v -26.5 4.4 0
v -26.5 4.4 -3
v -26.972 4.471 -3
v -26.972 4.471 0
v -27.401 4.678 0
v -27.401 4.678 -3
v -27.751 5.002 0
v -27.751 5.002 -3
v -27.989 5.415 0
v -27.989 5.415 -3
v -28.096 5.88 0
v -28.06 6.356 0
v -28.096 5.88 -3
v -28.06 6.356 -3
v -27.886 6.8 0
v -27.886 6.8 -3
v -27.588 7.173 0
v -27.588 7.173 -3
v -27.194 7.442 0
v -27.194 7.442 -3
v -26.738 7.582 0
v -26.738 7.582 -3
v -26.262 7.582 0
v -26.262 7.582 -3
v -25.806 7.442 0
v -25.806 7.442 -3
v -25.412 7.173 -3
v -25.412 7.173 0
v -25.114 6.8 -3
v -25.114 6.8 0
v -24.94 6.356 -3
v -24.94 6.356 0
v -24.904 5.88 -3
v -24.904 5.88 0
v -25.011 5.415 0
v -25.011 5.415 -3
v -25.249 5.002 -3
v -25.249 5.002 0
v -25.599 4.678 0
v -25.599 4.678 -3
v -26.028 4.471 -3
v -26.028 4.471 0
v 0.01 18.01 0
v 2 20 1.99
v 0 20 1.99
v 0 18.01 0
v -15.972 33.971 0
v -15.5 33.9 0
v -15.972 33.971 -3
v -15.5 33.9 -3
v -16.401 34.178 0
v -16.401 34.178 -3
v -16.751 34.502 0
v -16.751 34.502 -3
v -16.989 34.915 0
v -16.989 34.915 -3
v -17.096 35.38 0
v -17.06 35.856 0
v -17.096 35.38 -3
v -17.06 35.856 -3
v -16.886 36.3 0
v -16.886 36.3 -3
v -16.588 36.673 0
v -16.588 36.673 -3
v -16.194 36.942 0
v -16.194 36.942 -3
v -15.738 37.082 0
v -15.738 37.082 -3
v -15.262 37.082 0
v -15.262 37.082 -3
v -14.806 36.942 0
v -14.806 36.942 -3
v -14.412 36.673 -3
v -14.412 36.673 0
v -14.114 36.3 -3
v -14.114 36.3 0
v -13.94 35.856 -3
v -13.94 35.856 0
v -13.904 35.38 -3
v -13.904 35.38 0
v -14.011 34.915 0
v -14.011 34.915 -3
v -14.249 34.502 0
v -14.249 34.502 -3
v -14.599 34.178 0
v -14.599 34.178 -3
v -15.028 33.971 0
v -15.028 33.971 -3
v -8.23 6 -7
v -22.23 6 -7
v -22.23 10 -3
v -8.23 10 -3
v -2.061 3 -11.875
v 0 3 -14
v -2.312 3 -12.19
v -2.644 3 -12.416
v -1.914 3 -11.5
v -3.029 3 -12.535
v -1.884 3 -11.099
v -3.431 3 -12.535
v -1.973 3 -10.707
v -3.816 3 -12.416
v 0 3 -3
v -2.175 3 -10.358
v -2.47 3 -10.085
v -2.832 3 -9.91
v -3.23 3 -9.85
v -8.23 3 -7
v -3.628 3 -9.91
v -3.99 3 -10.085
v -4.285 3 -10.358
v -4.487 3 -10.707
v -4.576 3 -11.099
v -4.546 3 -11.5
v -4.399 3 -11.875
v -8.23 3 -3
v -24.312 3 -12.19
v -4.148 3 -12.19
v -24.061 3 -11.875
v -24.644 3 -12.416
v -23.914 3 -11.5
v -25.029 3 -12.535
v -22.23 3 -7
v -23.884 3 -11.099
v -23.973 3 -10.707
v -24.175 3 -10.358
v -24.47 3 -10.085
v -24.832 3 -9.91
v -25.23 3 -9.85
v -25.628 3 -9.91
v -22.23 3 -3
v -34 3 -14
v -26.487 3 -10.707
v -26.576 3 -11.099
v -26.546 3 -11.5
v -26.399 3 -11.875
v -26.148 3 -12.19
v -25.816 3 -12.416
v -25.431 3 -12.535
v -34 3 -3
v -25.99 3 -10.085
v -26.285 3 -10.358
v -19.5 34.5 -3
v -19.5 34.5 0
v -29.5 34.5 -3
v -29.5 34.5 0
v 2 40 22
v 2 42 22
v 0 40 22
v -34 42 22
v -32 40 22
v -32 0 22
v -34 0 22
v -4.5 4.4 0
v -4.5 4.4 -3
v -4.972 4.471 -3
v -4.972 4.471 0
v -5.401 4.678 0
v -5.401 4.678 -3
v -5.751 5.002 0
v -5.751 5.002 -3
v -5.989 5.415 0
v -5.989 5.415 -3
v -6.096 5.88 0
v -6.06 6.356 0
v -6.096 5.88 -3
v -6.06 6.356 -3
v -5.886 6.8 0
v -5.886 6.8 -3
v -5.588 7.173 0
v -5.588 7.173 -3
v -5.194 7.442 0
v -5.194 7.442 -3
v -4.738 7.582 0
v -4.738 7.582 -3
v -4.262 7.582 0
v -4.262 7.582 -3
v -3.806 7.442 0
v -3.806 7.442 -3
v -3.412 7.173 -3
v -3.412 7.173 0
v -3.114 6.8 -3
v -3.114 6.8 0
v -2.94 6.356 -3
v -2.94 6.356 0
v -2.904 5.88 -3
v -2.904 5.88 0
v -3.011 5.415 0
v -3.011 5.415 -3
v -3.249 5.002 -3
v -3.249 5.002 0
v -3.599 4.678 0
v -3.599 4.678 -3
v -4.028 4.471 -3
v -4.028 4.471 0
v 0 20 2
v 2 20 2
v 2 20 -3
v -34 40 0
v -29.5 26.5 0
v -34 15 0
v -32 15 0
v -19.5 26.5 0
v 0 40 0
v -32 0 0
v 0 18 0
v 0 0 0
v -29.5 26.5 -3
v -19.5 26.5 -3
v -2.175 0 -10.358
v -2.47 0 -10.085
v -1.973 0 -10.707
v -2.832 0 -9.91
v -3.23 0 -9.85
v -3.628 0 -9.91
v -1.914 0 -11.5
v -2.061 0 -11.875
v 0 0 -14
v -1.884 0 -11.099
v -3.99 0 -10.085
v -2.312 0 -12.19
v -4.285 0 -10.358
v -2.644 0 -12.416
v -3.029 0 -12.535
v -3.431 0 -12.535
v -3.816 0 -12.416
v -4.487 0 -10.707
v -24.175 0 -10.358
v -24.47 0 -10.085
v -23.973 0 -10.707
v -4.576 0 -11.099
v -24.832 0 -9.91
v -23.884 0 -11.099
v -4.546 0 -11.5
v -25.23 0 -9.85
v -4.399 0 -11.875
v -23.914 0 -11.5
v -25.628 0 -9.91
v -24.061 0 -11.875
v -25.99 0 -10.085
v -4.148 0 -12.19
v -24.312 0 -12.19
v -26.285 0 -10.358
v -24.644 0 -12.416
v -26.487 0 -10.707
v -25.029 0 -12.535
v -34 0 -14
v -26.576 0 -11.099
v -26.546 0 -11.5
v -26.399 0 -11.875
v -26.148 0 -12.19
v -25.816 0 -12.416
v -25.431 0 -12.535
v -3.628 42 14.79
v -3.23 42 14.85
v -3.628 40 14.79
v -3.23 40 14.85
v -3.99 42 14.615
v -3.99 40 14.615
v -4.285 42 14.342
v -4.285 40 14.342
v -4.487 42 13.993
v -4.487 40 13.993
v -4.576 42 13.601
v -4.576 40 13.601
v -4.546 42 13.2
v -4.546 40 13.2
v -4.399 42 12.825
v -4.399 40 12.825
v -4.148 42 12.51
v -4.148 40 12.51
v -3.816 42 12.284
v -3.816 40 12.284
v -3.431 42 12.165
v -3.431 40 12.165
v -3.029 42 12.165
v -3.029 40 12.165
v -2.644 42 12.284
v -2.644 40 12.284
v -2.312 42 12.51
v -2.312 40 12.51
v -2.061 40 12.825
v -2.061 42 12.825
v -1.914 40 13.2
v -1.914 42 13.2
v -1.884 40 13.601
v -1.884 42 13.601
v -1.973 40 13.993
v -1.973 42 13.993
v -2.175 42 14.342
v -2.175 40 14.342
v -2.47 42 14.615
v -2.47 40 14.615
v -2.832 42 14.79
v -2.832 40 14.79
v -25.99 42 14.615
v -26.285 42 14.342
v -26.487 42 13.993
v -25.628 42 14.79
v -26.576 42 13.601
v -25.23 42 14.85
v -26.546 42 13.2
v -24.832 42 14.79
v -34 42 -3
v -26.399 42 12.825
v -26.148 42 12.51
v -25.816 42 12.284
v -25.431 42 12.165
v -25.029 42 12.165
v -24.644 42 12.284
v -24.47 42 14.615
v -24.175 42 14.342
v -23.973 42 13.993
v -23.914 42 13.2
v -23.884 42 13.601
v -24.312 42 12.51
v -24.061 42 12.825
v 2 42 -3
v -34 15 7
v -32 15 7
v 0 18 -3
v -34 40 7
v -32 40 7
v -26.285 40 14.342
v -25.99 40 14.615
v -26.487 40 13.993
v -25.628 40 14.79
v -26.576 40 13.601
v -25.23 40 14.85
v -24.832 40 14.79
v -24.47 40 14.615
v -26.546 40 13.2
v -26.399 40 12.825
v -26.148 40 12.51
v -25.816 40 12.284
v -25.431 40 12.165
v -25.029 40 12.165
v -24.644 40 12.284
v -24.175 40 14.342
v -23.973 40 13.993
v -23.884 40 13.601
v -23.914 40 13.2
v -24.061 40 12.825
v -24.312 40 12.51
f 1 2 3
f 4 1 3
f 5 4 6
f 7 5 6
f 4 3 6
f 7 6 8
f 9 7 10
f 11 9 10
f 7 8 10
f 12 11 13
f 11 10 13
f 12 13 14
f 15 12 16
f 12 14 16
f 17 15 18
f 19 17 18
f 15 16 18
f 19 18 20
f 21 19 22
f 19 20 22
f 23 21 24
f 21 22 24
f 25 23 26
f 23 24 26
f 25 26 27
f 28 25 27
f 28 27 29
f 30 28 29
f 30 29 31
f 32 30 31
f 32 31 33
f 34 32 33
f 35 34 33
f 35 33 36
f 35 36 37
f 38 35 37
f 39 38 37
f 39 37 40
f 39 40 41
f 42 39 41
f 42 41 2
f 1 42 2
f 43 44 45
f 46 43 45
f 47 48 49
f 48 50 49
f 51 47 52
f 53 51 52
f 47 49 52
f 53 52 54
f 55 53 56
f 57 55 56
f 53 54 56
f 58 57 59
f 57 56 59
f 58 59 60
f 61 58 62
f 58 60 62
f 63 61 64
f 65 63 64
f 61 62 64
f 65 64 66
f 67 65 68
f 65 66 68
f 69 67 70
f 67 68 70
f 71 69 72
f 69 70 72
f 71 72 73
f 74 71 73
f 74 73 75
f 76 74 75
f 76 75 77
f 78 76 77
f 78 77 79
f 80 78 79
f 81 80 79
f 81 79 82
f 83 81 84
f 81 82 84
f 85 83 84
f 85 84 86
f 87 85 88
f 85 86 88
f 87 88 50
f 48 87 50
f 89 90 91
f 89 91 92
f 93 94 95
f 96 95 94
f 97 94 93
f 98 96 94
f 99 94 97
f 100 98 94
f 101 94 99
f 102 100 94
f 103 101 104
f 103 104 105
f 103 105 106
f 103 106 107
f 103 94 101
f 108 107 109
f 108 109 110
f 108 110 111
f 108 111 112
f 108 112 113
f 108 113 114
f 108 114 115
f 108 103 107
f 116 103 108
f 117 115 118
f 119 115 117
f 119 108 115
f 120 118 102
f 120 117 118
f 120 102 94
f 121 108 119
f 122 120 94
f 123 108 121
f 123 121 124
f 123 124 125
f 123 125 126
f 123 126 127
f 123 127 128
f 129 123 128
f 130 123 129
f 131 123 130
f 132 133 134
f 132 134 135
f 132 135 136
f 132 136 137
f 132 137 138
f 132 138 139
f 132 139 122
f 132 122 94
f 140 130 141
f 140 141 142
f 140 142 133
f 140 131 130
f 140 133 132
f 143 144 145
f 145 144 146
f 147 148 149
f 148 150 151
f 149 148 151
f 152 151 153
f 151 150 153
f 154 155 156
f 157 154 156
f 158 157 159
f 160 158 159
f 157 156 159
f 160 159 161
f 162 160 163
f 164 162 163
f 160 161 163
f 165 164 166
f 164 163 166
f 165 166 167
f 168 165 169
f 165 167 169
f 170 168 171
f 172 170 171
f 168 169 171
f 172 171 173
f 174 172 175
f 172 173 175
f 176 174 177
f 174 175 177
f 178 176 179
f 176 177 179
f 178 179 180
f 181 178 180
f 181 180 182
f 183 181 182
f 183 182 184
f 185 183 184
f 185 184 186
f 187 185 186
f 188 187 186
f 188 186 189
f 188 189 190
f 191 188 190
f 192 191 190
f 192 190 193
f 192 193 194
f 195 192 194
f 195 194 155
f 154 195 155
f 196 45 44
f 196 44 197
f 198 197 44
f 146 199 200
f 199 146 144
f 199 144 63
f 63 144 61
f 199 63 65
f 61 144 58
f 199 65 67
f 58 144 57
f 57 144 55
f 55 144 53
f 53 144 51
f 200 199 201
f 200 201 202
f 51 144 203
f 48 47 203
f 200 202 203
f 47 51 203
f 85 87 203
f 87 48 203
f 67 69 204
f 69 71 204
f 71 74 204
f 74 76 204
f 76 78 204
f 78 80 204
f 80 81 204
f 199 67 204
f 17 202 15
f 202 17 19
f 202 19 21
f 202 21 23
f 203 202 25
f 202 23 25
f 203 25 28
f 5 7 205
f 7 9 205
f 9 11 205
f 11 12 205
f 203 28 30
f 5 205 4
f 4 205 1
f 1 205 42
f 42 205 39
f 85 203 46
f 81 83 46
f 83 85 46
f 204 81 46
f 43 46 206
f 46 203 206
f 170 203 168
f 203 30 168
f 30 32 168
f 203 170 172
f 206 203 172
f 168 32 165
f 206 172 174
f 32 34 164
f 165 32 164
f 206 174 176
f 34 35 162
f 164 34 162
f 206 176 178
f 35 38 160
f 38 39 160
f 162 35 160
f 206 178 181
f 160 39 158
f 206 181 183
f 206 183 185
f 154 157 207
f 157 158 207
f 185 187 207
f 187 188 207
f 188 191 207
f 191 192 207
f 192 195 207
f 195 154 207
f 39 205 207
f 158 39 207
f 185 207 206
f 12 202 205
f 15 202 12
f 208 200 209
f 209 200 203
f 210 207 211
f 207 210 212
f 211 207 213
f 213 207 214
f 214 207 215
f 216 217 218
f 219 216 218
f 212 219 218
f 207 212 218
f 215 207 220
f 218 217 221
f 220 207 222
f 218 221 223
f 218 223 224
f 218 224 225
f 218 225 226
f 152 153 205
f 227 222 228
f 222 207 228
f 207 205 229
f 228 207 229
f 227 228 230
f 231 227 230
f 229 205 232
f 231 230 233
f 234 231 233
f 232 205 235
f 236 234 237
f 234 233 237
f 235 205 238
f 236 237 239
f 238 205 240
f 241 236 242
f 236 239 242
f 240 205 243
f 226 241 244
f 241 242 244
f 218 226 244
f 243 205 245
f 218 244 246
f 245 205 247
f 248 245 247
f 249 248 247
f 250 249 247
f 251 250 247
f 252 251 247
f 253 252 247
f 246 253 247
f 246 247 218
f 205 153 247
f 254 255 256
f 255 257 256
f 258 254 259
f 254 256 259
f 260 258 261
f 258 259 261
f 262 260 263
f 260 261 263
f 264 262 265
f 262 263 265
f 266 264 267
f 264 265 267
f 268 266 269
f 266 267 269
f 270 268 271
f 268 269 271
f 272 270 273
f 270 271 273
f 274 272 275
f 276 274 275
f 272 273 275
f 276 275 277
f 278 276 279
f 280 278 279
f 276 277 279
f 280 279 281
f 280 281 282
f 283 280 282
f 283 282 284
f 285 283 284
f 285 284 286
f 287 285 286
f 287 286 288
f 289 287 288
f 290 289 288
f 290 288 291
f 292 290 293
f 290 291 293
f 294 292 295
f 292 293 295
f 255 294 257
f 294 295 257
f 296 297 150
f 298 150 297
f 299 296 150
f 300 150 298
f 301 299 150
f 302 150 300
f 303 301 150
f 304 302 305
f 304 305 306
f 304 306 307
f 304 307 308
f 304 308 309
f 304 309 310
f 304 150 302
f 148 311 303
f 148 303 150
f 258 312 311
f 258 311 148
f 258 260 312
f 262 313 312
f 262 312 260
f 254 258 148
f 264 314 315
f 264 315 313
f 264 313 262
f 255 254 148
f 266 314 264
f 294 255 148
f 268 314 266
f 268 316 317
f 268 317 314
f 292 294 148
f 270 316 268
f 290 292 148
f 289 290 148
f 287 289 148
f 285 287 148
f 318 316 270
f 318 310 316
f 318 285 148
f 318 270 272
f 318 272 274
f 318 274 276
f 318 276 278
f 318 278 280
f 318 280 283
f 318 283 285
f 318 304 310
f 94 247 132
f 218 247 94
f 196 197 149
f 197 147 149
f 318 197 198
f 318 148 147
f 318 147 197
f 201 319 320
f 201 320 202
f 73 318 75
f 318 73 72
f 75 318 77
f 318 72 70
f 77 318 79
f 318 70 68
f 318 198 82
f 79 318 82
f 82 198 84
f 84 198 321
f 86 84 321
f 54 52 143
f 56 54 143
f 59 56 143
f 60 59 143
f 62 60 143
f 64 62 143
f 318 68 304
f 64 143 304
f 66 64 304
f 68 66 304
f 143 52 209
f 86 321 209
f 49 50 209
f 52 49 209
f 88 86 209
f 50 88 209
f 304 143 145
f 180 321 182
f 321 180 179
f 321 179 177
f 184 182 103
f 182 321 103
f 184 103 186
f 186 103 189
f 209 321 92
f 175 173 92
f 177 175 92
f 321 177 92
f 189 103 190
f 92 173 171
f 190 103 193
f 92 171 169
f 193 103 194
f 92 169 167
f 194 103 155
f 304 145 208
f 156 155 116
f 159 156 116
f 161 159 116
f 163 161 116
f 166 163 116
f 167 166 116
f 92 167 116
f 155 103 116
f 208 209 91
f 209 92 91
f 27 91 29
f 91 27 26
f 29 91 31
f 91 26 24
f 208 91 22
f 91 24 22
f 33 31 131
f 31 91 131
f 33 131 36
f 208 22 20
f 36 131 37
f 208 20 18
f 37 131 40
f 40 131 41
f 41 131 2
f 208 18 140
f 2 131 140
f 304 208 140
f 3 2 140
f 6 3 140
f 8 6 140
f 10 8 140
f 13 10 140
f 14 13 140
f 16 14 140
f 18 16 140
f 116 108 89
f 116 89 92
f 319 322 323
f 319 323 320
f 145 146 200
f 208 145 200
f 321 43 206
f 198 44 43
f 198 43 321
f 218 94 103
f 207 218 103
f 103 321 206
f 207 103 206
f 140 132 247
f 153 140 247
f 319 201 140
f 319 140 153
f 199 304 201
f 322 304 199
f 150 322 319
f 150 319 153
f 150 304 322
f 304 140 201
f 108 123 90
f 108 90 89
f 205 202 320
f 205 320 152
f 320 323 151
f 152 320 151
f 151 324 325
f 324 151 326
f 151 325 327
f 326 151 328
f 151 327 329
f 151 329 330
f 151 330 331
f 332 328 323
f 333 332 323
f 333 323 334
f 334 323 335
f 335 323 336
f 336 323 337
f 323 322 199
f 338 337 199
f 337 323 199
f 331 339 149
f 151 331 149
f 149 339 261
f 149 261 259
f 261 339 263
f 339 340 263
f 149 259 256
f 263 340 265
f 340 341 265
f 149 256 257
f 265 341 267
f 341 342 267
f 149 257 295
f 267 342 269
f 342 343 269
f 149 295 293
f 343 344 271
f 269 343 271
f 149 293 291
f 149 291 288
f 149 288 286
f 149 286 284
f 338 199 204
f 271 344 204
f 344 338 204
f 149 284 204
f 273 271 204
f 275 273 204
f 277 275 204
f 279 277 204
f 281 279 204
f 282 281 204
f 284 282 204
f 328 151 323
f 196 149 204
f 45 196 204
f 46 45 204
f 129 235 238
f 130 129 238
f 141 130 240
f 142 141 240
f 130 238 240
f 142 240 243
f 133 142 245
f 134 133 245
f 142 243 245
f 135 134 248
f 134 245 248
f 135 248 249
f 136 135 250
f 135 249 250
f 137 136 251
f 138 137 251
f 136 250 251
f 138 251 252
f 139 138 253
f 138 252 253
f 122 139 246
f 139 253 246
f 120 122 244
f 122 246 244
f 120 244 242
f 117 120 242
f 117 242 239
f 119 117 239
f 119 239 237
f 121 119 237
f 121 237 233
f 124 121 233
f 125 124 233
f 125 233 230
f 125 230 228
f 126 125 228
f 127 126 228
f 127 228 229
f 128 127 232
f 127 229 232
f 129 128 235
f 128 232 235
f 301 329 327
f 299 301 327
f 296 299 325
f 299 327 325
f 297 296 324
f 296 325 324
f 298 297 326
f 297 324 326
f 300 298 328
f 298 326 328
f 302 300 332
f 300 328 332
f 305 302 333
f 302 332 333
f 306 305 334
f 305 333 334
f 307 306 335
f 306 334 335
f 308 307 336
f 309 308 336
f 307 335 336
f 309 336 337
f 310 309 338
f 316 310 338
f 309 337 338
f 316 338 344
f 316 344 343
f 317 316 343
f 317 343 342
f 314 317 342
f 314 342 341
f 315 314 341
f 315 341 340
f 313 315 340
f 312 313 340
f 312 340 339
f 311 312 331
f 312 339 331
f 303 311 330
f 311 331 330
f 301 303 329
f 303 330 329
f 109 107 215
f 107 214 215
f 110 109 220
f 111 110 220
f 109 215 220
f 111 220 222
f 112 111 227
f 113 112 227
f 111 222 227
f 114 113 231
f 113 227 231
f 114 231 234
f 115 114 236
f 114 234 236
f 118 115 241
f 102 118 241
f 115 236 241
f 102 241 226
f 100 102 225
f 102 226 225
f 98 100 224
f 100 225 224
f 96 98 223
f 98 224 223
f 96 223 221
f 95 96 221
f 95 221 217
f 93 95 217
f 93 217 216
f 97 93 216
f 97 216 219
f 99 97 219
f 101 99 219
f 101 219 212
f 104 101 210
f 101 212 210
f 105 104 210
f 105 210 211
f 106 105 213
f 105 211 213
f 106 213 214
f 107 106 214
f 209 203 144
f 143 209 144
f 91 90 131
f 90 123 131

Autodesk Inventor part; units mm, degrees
ref_plane "YZ Plane" through (0, 0, 0) normal (1, 0, 0) x (0, 1, 0)
ref_plane "XZ Plane" through (0, 0, 0) normal (0, 1, 0) x (-1, 0, 0)
ref_plane "XY Plane" through (0, 0, 0) normal (0, 0, 1) x (1, 0, 0)
sketch "Sketch1" plane through (0, 0, 0) normal (0, 1, 0) x (-1, 0, 0)
  line L0 (0, 0) -> (34, 0)
  line L1 (34, 0) -> (34, -14)
  line L2 (34, -14) -> (0, -14)
  line L3 (0, -14) -> (0, 0)
  dimension "d0" = 34
  dimension "d1" = 14
extrude "Extrusion1" add sketch "Sketch1" along normal blind 3
sketch "Sketch2" plane through (0, 3, 0) normal (0, 1, 0) x (1, 0, 0)
  line L0 (-34, 0) -> (0, 0) projected
  line L1 (0, 0) -> (0, 14) projected
  line L2 (0, 14) -> (-34, 14) projected
  line L3 (-34, 14) -> (-34, 0) projected
  point P0 (-25.23, 11.2)
  point P1 (-3.23, 11.2)
  dimension "d59" = 22
  dimension "d60" = 8.77
hole "Hole1" at (-25.23, 3, -11.2) at (-3.23, 3, -11.2) direction (0, -1, 0) diameter 2.7 end through all
sketch "Sketch3" plane through (0, 3, 0) normal (0, 1, 0) x (1, 0, 0)
  circle A0 centre (-25.23, 11.2) radius 1.35 projected
  circle A1 centre (-3.23, 11.2) radius 1.35 projected
  line L0 (-34, 0) -> (0, 0) projected
  line L1 (0, 0) -> (0, 14) projected
  line L2 (0, 14) -> (-34, 14) projected
  line L3 (-34, 14) -> (-34, 0) projected
  line L4 (0, 0) -> (-34, 0) projected
  line L5 (-34, 0) -> (0, 0)
  line L6 (0, 0) -> (0, 3)
  line L7 (0, 3) -> (-34, 3)
  line L8 (-34, 3) -> (-34, 0)
  dimension "d14" = 3
extrude "Extrusion2" add sketch "Sketch3" along normal blind 39 contours L3 L7 L1 L0
sketch "Sketch4" plane through (0, 42, 0) normal (0, 1, 0) x (1, 0, 0)
  line L0 (-34, 0) -> (0, 0) projected
  line L1 (0, 0) -> (0, 3) projected
  line L2 (0, 3) -> (-34, 3) projected
  line L3 (-34, 3) -> (-34, 0) projected
  line L4 (-34, 3) -> (0, 3)
  line L5 (0, 3) -> (0, -22)
  line L6 (0, -22) -> (-34, -22)
  line L7 (-34, -22) -> (-34, 3)
  dimension "d17" = 25
extrude "Extrusion3" add sketch "Sketch4" against normal blind 2 contours L0 L5 L6 L7
sketch "Sketch6" plane through (0, 42, 0) normal (0, 1, 0) x (1, 0, 0)
  line L0 (0, -22) -> (0, 3) projected
  line L1 (0, 3) -> (-34, 3) projected
  line L2 (-34, 3) -> (-34, -22) projected
  line L3 (-34, -22) -> (0, -22) projected
  line L4 (0, 14) -> (0, -22) projected
  point P0 (0, 0)
  point P1 (-3.23, -13.5)
  point P2 (-25.23, -13.5)
  dimension "d57" = 22
  dimension "d58" = 3.23
hole "Hole2" at (-3.23, 42, 13.5) at (-25.23, 42, 13.5) direction (0, -1, 0) diameter 2.7 end through all
sketch "Sketch7" plane through (-34, 0, 0) normal (0, 0, 1) x (1, 0, 0)
  line L0 (34, 40) -> (0, 40) projected
  line L1 (0, 0) -> (0, 40) projected
  line L2 (34, 0) -> (0, 0) projected
  line L3 (34, 0) -> (34, 40) projected
  point P0 (7.5, 6)
  point P1 (29.5, 6)
  point P2 (18.5, 35.5)
  dimension "d50" = 11
  dimension "d51" = 29.5
  dimension "d52" = 22
  dimension "d55" = 4.5
hole "Hole3" at (-26.5, 6, 0) at (-4.5, 6, 0) at (-15.5, 35.5, 0) direction (0, 0, -1) diameter 3.2 end through all
sketch "Sketch8" plane through (-34, 0, 0) normal (0, 0, 1) x (1, 0, 0)
  circle A0 centre (29.5, 6) radius 1.6 projected
  circle A1 centre (7.5, 6) radius 1.6 projected
  circle A2 centre (18.5, 35.5) radius 1.6 projected
  line L0 (34, 40) -> (0, 40) projected
  line L1 (0, 0) -> (0, 40) projected
  line L2 (34, 0) -> (0, 0) projected
  line L3 (14.5, 34.5) -> (4.5, 34.5)
  line L4 (4.5, 34.5) -> (4.5, 26.5)
  line L5 (4.5, 26.5) -> (14.5, 26.5)
  line L6 (14.5, 26.5) -> (14.5, 34.5)
  line L7 (34, 0) -> (34, 40) projected
  dimension "d46" = 10
  dimension "d47" = 8
  dimension "d53" = 1
  dimension "d54" = 4
extrude "Extrusion5" cut sketch "Sketch8" against normal blind 3 contours L6 L5 L4 L3
sketch "Sketch9" plane through (-34, 0, -14) normal (-1, 0, 0) x (0, 0, 1)
  line L0 (14, 0) -> (0, 0) projected
  line L1 (14, 0) -> (14, 40) projected
  line L2 (36, 40) -> (14, 40) projected
  line L3 (36, 42) -> (36, 40) projected
  line L4 (11, 42) -> (36, 42) projected
  line L5 (11, 3) -> (11, 42) projected
  line L6 (0, 3) -> (11, 3) projected
  line L7 (0, 0) -> (0, 3) projected
  line L8 (14, 40) -> (36, 40)
  line L9 (36, 40) -> (36, 0)
  line L10 (36, 0) -> (14, 0)
  line L11 (14, 0) -> (14, 40)
extrude "Extrusion6" add sketch "Sketch9" against normal blind 2 contours L1 L2 L9 L10
sketch "Sketch10" plane through (0, 0, 0) normal (1, 0, 0) x (0, 0, -1)
  line L0 (14, 0) -> (0, 0) projected
  line L1 (14, 0) -> (14, 3) projected
  line L2 (3, 3) -> (14, 3) projected
  line L3 (3, 3) -> (3, 42) projected
  line L4 (-22, 42) -> (3, 42) projected
  line L5 (-22, 42) -> (-22, 40) projected
  line L6 (0, 40) -> (-22, 40) projected
  line L7 (0, 0) -> (0, 40) projected
  line L8 (-22, 42) -> (-22, 40) projected
  line L9 (3, 3) -> (3, 42) projected
  line L10 (-22, 42) -> (3, 42)
  line L11 (3, 42) -> (3, 20)
  line L12 (3, 20) -> (-22, 20)
  line L13 (-22, 20) -> (-22, 42)
  dimension "d63" = 22
extrude "Extrusion7" add sketch "Sketch10" along normal blind 2 contours L12 L13 L6 L7 | L7 L6 L5 L4 L3 L12
chamfer "Chamfer1" distance 2 angle 45 1 edges at (0, 20, -1.5)
chamfer "Chamfer2" distance 20 angle 45 1 edges at (1, 20, 22)
chamfer "Chamfer3" distance 1.99 angle 45 1 edges at (0.9999, 20, 0)
sketch "Sketch11" plane through (-34, 0, -14) normal (-1, 0, 0) x (0, 0, 1)
  line L0 (14, 40) -> (14, 0) projected
  line L1 (36, 40) -> (14, 40) projected
  line L2 (14, 40) -> (21, 40)
  line L3 (21, 40) -> (21, 15)
  line L4 (21, 15) -> (14, 15)
  line L5 (14, 15) -> (14, 40)
  dimension "d75" = 7
  dimension "d76" = 25
extrude "Extrusion8" cut sketch "Sketch11" against normal blind 2
sketch "Sketch12" plane through (0, 3, 0) normal (0, 1, 0) x (1, 0, 0)
  line L0 (-34, 3) -> (0, 3) projected
  line L1 (0, 3) -> (0, 14) projected
  line L2 (0, 14) -> (-34, 14) projected
  line L3 (-34, 14) -> (-34, 3) projected
  circle A0 centre (-25.23, 11.2) radius 1.35 projected
  circle A1 centre (-3.23, 11.2) radius 1.35 projected
  line L4 (-34, 3) -> (0, 3) projected
  line L5 (-3.23, 11.2) -> (-8.23, 11.2)
  line L6 (-8.23, 11.2) -> (-8.23, 3)
  line L7 (-8.23, 3) -> (-3.23, 3)
  line L8 (-3.23, 3) -> (-3.23, 11.2)
  line L9 (-25.23, 11.2) -> (-22.23, 11.2)
  line L10 (-22.23, 11.2) -> (-22.23, 3)
  line L11 (-22.23, 3) -> (-25.23, 3)
  line L12 (-25.23, 3) -> (-25.23, 11.2)
  line L13 (-8.23, 3) -> (-22.23, 3)
  line L14 (-22.23, 3) -> (-22.23, 7)
  line L15 (-22.23, 7) -> (-8.23, 7)
  line L16 (-8.23, 7) -> (-8.23, 3)
  point P0 (0, 0)
  dimension "d79" = 5
  dimension "d80" = 3
  dimension "d81" = 4
extrude "Extrusion9" add sketch "Sketch12" along normal blind 7 contours L10 L15 L6 L0
chamfer "Chamfer4" distance 4 angle 45 1 edges at (-15.23, 10, -7)
properties part number "PantatKanan" material "Iron, Gray"
